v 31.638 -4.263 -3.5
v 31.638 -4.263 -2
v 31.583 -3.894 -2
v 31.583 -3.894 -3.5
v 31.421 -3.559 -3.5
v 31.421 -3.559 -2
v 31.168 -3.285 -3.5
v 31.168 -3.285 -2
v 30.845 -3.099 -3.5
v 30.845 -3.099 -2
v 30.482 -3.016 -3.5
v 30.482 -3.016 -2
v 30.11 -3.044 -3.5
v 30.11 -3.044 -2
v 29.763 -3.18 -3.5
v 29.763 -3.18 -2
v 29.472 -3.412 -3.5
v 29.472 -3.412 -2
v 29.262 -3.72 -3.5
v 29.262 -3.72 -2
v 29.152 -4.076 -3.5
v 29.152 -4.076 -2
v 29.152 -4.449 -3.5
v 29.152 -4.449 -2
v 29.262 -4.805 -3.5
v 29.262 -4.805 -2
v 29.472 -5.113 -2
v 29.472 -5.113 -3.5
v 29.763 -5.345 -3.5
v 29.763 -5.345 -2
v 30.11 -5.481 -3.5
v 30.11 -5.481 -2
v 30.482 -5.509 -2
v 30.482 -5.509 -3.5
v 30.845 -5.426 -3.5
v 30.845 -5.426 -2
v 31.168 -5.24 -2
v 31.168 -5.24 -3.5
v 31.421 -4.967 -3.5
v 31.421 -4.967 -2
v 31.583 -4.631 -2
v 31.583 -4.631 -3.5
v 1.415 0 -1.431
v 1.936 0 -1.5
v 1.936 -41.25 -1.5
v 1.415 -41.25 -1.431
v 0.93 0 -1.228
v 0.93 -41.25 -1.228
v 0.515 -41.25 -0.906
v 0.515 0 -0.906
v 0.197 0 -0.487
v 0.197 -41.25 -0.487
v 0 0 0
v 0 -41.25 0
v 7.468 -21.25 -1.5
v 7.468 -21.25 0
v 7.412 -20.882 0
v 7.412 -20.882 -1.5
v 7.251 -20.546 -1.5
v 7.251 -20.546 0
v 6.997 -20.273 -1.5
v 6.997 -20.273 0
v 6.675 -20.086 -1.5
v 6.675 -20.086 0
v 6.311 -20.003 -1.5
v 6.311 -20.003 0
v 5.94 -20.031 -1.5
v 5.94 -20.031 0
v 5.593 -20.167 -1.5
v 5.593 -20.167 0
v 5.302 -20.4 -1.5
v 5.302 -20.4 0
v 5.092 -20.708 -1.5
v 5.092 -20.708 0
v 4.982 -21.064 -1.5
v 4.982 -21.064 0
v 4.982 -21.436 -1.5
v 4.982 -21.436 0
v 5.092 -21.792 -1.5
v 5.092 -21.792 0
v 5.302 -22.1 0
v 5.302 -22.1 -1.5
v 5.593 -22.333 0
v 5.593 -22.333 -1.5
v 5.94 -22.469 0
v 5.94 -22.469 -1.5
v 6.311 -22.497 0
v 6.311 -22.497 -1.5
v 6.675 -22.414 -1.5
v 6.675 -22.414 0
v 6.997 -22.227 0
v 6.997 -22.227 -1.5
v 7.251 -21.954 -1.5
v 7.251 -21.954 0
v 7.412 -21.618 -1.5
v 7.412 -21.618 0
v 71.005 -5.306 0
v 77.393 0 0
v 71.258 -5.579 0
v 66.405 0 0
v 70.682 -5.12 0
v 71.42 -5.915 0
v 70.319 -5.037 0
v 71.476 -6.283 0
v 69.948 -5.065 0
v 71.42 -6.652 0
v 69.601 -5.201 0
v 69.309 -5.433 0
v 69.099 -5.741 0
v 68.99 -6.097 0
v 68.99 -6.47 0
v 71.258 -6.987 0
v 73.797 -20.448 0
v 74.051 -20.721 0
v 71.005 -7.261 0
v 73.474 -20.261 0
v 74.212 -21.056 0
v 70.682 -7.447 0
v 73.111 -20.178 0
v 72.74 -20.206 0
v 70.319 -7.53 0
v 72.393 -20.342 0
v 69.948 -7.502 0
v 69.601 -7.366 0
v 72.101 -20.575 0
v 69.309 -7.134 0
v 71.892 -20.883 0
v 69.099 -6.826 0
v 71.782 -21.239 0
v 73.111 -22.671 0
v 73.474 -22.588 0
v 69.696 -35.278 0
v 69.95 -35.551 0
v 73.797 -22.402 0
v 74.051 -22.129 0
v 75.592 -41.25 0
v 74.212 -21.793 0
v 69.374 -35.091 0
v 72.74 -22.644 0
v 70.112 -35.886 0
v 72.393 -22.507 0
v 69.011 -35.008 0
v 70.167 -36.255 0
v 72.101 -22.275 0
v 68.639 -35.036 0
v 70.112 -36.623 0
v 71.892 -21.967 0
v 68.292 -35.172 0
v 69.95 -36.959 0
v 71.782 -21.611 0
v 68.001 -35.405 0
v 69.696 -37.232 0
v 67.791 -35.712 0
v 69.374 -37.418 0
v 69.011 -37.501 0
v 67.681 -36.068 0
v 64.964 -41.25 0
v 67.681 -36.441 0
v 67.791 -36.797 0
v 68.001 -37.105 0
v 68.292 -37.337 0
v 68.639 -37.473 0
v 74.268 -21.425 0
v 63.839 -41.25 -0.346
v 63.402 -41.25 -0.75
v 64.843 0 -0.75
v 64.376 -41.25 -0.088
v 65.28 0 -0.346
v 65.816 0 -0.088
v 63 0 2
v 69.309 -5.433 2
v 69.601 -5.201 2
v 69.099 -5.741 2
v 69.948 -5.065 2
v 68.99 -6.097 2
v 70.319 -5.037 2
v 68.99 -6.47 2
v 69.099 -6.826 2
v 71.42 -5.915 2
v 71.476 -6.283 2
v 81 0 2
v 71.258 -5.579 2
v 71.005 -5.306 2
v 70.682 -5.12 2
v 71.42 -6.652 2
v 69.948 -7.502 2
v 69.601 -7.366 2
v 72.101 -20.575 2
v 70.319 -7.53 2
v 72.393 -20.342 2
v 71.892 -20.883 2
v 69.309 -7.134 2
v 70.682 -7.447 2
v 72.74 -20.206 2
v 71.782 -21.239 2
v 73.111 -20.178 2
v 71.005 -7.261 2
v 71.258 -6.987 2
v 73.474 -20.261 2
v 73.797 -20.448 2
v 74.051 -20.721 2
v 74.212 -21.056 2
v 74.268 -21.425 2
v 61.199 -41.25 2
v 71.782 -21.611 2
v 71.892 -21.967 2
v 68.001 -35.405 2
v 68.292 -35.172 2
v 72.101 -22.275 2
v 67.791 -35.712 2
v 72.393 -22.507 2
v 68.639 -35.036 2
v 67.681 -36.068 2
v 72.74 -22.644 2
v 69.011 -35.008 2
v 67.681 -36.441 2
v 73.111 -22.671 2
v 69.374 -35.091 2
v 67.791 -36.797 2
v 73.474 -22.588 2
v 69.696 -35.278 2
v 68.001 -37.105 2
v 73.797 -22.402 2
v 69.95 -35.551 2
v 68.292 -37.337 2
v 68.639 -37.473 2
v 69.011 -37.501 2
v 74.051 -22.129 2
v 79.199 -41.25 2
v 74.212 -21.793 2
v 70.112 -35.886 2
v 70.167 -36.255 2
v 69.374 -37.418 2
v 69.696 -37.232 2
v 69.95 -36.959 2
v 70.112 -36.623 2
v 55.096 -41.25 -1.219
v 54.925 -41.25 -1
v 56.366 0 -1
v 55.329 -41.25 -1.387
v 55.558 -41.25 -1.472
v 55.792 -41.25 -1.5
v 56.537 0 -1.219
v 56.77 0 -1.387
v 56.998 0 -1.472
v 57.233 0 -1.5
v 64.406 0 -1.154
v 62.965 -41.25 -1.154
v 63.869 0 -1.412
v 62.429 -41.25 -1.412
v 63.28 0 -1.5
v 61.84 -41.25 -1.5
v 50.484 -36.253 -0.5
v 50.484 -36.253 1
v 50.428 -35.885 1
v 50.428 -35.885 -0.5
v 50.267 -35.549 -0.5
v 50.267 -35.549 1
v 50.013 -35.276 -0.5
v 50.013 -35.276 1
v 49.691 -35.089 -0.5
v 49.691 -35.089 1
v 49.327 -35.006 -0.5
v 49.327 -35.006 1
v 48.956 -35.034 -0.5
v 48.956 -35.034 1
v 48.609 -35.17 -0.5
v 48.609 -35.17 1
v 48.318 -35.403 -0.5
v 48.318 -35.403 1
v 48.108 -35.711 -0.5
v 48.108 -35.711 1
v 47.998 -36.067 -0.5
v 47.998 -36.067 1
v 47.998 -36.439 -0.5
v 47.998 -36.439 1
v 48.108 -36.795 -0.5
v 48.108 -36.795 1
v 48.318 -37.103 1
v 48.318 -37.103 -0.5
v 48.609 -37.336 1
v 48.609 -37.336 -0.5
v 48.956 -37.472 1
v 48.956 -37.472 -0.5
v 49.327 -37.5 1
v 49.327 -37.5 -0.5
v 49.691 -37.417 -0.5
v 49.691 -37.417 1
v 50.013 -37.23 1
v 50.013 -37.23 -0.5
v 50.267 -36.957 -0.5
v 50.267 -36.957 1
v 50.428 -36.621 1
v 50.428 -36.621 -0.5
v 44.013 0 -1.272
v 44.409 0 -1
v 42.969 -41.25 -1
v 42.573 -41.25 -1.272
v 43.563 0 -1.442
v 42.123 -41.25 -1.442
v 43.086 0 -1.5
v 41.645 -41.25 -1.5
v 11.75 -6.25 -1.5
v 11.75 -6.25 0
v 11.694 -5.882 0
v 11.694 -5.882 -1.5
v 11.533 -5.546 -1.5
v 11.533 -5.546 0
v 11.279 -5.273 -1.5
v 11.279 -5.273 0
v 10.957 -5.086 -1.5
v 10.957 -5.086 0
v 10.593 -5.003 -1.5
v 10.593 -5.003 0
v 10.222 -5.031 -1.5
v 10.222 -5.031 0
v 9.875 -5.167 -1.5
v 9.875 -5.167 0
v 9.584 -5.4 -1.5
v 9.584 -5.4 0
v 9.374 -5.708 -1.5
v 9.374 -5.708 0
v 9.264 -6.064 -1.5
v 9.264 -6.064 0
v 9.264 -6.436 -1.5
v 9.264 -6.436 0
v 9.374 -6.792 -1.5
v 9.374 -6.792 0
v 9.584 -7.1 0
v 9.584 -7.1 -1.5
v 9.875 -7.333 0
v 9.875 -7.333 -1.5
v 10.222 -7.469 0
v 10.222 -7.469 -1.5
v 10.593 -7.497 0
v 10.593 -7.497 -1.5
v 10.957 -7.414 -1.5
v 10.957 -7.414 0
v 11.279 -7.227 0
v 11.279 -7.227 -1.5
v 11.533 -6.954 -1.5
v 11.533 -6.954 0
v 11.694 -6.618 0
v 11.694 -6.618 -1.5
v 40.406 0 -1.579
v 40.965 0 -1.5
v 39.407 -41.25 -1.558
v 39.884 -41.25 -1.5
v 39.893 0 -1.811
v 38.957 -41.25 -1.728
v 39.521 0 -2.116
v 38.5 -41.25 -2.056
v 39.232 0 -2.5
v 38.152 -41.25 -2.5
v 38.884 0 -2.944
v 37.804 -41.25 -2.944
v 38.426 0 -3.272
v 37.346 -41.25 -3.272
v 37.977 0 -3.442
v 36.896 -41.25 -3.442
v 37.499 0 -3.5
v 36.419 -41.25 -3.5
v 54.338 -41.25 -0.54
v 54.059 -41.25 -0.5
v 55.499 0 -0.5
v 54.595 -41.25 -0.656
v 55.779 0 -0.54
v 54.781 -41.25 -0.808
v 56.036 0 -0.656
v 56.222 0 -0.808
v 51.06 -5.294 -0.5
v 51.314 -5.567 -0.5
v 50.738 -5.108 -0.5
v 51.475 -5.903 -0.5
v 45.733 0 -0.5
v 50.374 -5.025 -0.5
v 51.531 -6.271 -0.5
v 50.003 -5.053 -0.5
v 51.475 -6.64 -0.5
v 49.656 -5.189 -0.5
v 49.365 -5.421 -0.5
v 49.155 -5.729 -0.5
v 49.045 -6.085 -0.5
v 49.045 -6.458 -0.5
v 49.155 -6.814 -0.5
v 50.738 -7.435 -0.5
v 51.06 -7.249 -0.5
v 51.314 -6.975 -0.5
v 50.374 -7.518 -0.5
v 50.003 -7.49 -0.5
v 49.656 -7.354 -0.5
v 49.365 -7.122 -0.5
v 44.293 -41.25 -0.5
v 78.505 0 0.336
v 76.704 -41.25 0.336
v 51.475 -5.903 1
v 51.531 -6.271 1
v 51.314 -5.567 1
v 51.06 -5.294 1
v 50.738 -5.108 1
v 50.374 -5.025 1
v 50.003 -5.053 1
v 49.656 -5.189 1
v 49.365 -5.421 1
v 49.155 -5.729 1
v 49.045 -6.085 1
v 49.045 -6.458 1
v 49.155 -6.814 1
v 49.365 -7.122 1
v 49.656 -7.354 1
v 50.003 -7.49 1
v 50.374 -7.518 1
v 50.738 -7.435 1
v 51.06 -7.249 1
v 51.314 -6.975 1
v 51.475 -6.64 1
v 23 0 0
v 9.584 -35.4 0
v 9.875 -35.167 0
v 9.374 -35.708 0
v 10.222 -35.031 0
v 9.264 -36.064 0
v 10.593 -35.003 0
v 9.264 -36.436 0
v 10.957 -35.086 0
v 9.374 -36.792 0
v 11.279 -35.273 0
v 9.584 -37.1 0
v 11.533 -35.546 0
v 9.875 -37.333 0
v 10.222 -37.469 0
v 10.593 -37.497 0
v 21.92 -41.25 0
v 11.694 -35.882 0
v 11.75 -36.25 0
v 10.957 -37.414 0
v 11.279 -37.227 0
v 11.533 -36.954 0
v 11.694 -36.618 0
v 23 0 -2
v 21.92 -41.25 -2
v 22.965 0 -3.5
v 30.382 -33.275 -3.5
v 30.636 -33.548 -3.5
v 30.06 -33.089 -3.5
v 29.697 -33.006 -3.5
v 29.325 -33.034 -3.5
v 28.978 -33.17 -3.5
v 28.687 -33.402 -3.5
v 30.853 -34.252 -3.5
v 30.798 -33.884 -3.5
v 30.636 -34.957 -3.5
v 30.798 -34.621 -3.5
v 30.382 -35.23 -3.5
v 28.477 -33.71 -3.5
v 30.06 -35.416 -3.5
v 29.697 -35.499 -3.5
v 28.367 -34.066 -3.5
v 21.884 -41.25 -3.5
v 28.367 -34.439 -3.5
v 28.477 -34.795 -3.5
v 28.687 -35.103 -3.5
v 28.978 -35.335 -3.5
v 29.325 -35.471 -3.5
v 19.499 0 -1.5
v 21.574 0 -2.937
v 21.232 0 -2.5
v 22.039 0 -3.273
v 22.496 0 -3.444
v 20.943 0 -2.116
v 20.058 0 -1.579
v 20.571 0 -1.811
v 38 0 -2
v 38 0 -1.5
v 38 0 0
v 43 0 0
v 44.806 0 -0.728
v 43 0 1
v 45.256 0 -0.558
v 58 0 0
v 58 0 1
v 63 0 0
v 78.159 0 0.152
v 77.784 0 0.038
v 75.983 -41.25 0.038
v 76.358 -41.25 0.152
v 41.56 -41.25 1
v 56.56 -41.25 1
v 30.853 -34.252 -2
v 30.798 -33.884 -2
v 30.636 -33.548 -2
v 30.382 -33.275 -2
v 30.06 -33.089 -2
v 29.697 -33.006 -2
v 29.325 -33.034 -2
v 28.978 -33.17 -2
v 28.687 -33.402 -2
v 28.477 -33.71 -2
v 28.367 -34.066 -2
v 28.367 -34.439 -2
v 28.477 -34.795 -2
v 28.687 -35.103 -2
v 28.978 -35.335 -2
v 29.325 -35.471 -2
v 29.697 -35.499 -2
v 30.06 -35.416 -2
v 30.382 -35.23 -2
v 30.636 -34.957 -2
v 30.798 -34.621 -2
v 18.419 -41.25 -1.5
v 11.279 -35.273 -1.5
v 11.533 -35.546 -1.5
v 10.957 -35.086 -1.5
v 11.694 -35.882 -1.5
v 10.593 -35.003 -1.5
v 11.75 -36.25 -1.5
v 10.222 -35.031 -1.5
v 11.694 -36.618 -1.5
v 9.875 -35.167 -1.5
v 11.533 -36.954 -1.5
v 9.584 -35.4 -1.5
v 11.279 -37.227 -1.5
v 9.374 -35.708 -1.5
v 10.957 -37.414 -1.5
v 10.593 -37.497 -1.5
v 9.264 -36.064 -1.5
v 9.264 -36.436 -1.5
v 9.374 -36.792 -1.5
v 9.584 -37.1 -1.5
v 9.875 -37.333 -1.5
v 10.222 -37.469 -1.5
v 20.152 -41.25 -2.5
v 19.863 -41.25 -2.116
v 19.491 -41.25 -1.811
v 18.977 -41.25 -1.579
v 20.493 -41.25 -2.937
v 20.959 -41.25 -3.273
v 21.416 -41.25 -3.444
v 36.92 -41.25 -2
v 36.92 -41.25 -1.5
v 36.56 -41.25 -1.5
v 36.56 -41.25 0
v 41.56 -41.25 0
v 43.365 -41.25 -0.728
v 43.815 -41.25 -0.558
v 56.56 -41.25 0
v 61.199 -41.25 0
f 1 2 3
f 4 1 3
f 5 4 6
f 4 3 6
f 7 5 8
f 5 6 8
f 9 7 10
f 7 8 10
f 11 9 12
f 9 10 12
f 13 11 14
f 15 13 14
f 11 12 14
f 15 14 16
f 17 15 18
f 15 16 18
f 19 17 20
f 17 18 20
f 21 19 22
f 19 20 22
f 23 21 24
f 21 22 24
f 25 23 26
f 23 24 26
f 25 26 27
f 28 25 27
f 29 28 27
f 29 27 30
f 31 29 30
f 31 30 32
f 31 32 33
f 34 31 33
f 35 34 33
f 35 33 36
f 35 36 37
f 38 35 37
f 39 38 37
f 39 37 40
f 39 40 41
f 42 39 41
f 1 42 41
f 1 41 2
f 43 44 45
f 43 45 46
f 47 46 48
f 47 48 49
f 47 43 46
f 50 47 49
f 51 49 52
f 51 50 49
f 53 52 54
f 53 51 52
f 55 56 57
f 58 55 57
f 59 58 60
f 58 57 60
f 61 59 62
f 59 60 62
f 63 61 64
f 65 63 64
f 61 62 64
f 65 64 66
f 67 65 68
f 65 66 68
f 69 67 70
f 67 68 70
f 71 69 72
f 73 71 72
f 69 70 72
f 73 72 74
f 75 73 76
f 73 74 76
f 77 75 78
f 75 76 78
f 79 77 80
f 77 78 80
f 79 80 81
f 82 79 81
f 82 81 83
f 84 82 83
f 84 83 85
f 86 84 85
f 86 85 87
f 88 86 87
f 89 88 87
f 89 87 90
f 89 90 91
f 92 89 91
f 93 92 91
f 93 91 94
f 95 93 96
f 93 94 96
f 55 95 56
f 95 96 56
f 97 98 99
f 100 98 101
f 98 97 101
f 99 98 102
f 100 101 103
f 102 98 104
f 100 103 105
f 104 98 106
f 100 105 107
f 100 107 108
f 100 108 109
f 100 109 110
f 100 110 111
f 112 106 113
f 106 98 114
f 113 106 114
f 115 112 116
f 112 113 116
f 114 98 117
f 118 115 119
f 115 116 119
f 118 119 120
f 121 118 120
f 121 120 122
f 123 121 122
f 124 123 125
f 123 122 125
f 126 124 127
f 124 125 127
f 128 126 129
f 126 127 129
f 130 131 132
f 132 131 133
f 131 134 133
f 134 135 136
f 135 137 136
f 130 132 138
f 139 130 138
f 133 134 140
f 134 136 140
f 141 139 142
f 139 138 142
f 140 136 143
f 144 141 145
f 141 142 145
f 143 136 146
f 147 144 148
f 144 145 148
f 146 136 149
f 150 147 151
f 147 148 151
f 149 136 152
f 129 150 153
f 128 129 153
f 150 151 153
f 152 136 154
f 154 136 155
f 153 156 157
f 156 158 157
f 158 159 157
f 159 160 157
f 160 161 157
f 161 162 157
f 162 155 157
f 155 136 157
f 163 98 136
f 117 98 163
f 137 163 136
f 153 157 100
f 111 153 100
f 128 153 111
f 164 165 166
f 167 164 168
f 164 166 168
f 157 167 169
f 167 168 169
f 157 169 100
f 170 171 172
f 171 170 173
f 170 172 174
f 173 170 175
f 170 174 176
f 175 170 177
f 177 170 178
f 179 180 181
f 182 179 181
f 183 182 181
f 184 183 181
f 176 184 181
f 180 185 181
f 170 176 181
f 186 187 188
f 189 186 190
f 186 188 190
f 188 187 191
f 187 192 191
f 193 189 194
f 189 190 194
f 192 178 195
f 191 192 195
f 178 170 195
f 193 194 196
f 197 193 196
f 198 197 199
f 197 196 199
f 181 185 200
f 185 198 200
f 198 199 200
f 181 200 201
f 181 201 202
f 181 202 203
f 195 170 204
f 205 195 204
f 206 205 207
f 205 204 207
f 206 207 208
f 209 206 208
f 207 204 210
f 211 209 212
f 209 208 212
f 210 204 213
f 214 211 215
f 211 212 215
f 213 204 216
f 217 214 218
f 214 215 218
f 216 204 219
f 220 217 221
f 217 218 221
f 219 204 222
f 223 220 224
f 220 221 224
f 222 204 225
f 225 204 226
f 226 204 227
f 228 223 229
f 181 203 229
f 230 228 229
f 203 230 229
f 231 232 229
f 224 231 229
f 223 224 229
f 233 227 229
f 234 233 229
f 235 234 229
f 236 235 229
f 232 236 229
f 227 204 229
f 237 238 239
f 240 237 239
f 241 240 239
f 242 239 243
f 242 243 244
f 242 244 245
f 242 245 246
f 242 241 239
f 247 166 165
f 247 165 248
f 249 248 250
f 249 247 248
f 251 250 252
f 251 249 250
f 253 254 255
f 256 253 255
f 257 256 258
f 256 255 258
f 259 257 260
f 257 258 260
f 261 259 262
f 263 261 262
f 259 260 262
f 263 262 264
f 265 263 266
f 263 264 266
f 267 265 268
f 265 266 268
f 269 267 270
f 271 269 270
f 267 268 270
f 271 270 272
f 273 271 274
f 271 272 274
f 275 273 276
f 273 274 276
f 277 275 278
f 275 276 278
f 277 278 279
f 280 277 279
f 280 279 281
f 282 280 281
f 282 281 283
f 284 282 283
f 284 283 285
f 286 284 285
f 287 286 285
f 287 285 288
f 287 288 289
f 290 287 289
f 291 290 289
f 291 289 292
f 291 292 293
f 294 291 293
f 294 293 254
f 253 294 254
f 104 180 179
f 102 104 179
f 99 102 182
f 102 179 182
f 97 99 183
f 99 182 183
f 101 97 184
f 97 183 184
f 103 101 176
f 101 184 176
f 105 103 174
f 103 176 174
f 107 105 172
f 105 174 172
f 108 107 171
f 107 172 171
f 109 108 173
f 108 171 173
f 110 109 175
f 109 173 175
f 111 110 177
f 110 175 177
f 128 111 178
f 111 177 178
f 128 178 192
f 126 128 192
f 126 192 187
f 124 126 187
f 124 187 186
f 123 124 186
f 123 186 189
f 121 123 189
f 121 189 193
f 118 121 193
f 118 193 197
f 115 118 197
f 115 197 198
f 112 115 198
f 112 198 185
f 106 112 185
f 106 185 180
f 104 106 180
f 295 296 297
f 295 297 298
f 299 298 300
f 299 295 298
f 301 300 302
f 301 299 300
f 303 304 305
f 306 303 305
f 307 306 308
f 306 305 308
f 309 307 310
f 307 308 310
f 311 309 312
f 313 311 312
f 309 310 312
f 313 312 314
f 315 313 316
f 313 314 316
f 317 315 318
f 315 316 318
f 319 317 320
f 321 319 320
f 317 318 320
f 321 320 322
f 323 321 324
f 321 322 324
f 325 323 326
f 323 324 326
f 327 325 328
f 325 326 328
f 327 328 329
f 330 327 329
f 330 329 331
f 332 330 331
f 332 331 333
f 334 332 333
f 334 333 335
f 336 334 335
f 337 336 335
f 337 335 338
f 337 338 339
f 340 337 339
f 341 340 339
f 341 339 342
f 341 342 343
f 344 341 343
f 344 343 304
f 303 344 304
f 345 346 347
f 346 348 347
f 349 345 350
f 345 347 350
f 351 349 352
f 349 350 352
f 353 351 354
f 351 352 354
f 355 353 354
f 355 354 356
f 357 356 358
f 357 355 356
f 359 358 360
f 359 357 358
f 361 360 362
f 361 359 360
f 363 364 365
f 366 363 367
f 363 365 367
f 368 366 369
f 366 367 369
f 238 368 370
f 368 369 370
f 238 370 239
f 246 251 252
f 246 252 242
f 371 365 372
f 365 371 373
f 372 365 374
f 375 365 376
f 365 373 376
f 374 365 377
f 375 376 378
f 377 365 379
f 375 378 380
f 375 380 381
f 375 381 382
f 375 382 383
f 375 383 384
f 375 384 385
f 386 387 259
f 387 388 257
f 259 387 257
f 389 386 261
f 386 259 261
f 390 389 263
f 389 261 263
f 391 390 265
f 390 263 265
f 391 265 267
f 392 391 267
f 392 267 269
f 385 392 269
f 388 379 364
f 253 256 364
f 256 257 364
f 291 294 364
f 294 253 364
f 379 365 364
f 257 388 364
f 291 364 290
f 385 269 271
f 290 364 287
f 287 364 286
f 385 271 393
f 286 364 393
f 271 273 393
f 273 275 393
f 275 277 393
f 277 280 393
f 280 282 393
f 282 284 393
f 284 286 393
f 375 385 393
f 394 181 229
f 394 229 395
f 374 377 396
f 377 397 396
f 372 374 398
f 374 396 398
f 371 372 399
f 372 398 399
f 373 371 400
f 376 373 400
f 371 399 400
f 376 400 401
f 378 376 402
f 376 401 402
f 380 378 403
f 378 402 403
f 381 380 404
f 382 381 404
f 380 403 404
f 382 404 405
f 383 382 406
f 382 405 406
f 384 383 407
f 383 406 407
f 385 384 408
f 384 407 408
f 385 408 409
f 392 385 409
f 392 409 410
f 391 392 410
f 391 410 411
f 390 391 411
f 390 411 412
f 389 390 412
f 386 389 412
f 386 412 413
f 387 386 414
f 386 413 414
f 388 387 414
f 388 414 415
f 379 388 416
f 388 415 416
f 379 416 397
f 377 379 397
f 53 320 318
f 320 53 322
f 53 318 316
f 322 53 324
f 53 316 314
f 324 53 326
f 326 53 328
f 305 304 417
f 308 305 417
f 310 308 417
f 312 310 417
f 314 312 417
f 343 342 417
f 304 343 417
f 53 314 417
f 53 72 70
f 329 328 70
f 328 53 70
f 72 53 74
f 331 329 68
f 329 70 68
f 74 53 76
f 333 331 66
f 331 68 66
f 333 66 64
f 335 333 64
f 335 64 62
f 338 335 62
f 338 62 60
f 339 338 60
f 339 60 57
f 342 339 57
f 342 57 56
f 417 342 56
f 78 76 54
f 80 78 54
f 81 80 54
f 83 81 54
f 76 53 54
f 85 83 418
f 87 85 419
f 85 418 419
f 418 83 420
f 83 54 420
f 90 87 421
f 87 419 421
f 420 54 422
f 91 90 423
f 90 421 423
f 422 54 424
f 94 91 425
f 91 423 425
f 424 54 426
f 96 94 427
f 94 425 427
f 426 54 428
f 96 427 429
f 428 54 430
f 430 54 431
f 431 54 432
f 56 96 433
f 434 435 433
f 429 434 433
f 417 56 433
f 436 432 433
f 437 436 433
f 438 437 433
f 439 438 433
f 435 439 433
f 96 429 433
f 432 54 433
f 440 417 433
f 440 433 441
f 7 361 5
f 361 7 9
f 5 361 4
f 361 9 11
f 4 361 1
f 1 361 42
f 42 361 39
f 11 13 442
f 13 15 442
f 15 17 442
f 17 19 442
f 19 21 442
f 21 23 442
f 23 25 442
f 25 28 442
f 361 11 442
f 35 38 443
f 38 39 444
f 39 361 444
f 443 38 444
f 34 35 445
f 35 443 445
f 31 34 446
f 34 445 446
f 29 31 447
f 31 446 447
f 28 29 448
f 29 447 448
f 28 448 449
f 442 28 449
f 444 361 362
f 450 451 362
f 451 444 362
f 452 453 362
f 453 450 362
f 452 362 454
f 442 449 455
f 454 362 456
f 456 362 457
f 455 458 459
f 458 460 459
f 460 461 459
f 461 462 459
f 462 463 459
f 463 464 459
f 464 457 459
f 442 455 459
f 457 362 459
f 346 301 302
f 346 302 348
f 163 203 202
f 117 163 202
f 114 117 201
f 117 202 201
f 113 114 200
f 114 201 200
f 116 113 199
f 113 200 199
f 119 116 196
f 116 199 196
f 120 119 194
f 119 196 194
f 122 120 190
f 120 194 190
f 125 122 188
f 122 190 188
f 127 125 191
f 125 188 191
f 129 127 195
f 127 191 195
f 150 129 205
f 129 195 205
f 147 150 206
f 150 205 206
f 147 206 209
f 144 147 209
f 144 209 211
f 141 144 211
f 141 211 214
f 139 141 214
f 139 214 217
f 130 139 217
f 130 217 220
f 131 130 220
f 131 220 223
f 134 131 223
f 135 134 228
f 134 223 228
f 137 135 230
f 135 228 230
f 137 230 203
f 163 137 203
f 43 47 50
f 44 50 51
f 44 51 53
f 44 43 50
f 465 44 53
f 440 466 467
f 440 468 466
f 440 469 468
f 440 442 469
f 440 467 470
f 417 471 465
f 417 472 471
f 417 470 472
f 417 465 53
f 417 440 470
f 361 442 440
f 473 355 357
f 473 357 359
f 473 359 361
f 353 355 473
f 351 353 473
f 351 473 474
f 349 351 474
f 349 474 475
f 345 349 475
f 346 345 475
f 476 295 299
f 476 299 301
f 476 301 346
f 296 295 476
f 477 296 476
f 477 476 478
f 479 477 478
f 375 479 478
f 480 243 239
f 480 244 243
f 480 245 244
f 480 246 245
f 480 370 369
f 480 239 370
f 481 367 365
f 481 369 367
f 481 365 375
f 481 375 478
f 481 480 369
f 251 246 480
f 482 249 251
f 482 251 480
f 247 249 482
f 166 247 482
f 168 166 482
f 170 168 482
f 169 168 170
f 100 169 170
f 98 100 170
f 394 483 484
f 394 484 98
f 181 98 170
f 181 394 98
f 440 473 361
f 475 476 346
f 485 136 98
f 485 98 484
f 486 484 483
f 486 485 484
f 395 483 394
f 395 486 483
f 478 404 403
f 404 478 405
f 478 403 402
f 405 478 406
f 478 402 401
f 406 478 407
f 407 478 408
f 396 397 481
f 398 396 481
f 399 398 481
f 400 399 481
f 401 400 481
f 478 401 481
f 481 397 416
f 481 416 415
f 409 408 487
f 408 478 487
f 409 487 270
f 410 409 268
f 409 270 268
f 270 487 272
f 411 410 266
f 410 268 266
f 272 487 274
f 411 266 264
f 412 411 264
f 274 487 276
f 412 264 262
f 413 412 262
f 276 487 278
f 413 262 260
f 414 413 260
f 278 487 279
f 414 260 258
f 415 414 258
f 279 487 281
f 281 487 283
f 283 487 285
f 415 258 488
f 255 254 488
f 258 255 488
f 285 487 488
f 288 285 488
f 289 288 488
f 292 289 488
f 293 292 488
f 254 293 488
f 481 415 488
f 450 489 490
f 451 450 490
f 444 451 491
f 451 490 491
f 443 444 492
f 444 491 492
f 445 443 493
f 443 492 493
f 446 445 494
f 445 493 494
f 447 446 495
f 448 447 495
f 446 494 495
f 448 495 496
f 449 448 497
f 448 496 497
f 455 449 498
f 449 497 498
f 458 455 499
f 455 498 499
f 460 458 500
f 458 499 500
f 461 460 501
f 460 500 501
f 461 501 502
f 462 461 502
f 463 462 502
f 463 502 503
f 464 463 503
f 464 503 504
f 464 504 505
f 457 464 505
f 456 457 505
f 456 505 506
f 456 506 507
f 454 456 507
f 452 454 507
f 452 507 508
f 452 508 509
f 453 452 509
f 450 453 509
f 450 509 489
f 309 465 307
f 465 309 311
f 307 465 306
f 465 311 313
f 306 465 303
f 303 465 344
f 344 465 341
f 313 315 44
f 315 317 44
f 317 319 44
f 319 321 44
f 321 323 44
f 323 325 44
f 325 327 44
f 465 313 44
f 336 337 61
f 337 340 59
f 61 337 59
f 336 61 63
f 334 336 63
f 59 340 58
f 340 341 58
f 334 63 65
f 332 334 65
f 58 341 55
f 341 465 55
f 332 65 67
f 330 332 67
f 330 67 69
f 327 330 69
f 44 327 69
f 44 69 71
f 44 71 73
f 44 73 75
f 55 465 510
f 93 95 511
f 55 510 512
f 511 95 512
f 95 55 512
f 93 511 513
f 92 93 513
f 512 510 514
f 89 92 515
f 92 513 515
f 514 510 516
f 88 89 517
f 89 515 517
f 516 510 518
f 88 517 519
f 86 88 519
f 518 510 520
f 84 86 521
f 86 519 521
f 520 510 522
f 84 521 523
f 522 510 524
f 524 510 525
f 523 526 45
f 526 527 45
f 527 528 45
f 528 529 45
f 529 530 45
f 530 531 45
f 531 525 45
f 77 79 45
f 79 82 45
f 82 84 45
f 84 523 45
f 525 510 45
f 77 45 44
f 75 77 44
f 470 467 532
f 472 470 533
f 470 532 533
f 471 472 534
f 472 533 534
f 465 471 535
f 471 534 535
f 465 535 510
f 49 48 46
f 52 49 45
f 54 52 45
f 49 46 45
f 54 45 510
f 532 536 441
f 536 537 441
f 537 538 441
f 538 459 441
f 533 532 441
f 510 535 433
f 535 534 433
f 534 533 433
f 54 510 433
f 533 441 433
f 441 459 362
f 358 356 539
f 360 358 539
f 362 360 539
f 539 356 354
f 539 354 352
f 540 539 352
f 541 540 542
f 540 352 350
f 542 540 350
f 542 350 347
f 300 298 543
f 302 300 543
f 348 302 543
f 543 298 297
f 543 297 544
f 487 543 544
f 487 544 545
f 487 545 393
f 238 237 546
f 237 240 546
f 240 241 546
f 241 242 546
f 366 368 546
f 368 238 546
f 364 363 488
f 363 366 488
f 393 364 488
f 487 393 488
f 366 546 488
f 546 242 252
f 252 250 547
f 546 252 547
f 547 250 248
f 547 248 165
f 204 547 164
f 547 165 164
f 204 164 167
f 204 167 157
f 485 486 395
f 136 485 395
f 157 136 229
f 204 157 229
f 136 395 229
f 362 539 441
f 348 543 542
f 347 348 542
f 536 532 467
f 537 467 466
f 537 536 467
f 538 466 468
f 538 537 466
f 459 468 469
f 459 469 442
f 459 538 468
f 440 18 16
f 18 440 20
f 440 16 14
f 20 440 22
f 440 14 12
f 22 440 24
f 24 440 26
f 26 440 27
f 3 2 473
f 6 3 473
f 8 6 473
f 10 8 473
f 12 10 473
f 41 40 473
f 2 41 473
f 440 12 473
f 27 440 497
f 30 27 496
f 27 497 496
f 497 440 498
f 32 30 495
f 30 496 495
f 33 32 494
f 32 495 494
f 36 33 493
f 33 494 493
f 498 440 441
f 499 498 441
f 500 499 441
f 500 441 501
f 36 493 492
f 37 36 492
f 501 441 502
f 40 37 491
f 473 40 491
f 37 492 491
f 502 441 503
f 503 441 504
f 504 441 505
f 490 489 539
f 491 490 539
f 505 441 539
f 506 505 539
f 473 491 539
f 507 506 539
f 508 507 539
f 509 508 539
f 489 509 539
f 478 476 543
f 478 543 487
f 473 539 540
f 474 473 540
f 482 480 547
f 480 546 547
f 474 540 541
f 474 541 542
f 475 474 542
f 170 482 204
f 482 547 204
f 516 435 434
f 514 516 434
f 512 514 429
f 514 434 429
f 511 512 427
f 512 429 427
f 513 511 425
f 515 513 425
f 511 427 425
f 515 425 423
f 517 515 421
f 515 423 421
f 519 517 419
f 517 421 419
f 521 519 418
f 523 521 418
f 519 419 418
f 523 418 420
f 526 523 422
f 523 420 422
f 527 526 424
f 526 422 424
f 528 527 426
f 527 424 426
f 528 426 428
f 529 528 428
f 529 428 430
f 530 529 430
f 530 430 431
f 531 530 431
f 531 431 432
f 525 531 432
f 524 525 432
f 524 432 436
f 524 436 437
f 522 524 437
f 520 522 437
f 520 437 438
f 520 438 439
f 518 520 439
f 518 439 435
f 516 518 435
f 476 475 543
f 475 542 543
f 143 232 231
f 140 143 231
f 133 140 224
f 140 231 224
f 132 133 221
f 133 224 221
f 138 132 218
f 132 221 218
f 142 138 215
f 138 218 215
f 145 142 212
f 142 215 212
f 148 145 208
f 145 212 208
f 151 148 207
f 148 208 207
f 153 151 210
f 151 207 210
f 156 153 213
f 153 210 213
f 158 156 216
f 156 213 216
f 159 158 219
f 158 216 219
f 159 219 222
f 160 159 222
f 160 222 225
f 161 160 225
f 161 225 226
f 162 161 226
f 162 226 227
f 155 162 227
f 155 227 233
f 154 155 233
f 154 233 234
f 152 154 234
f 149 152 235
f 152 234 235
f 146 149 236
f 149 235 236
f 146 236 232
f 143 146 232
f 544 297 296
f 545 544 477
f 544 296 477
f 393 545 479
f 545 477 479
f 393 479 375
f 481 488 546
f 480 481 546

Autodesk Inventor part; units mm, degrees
ref_plane "YZ Plane" through (0, 0, 0) normal (1, 0, 0) x (0, 1, 0)
ref_plane "XY Plane" through (0, 0, 0) normal (0, 0, 1) x (1, 0, 0)
sketch "Sketch1" plane through (0, 0, 0) normal (0, 0, 1) x (1, 0, 0)
  line L0 (0, 0) -> (81, 0)
  line L1 (0, 0) -> (0, -41.25)
  line L2 (0, -41.25) -> (76.5595, -41.25)
  line L3 (10.5, 0) -> (10.5, -41.25)
  line L4 (30.5, 0) -> (29.4198, -41.25)
  line L5 (30.5, 0) -> (71.7641, 0) construction
  line L6 (50.5, 0) -> (49.0595, -41.25)
  line L7 (70.5, 0) -> (68.699, -41.25)
  line L8 (78, 0) -> (76.5595, -41.25)
  line L9 (78, 0) -> (119.2751, 0) construction
  line L10 (76.5595, -41.25) -> (81, 0)
  line L11 (3, 0) -> (3, -41.25)
  line L12 (18, 0) -> (18, -41.25)
  line L13 (23, 0) -> (21.9198, -41.25)
  line L14 (23, 0) -> (64.2641, 0) construction
  line L15 (38, 0) -> (36.9198, -41.25)
  line L16 (38, 0) -> (79.2641, 0) construction
  line L17 (43, 0) -> (41.5595, -41.25)
  line L18 (43, 0) -> (84.2751, 0) construction
  line L19 (58, 0) -> (56.5595, -41.25)
  line L20 (58, 0) -> (99.2751, 0) construction
  line L21 (63, 0) -> (61.199, -41.25)
  line L22 (63, 0) -> (104.2893, 0) construction
  line L23 (29.4198, -41.25) -> (29.6031, -34.2524)
  line L24 (29.6031, -34.2524) -> (30.3884, -4.2627)
  line L25 (49.0595, -41.25) -> (49.234, -36.253)
  line L26 (49.234, -36.253) -> (50.281, -6.2713)
  line L27 (68.699, -41.25) -> (68.9171, -36.2548)
  line L28 (68.9171, -36.2548) -> (70.2257, -6.2833)
  circle A0 centre (10.5, -6.25) radius 1.25
  circle A1 centre (10.5, -36.25) radius 1.25
  circle A2 centre (30.3884, -4.2627) radius 1.25
  circle A3 centre (29.6031, -34.2524) radius 1.25
  circle A4 centre (50.281, -6.2713) radius 1.25
  circle A5 centre (49.234, -36.253) radius 1.25
  circle A6 centre (70.2257, -6.2833) radius 1.25
  circle A7 centre (68.9171, -36.2548) radius 1.25
  line L29 (10.5, -6.25) -> (10.5, -21.25)
  line L30 (10.5, -21.25) -> (6.218, -21.25)
  circle A8 centre (6.218, -21.25) radius 1.25
  line L31 (6.218, -21.25) -> (73.0178, -21.4249)
  line L32 (6.218, -21.25) -> (73.018, -21.25) construction
  circle A9 centre (73.0178, -21.4249) radius 1.25
  dimension "d10" = 92
  dimension "d11" = 91.5
  dimension "d12" = 91.5
  dimension "d13" = 92
  dimension "d14" = 92
  dimension "d15" = 92.5
  dimension "d67" = 2.5
  dimension "d68" = 2.5
  dimension "d69" = 2.5
  dimension "d70" = 2.5
  dimension "d71" = 2.5
  dimension "d72" = 2.5
  dimension "d73" = 2.5
  dimension "d74" = 2.5
  dimension "d77" = 15
  dimension "d78" = 4.282
  dimension "d79" = 2.5
  dimension "d80" = 66.8
  dimension "d81" = 0.15
  dimension "d82" = 2.5
sketch "Sketch2" plane through (0, 0, 0) normal (0, 1, 0) x (-1, 0, 0)
  line L0 (-43, 0) -> (-58, 0)
  line L1 (-58, 0) -> (-58, 1)
  line L2 (-58, 1) -> (-43, 1)
  line L3 (-43, 1) -> (-43, 0)
  line L4 (-64.4672, 0) -> (-78, 0)
  line L5 (-78, 0) -> (-78, 2)
  line L6 (-78, 2) -> (-63, 2)
  line L7 (-63, 2) -> (-63, 0)
  line L8 (-23, 0) -> (-21.9198, 0) projected
  line L9 (-30.5, 0) -> (-29.4198, 0) projected
  line L10 (-23, 0) -> (-38, 0)
  line L11 (-38, 0) -> (-38, -2)
  line L12 (-38, -2) -> (-23, -2)
  line L13 (-23, -2) -> (-23, 0)
  line L14 (0, 0) -> (-23, 0)
  line L15 (-23, 0) -> (-23, -1.5)
  line L16 (-21.5, -1.5) -> (0, -1.5)
  line L17 (0, -1.5) -> (0, 0)
  line L18 (-23, 0) -> (-21.5, 0)
  line L19 (-21.5, -1.5) -> (-21.5, -3.5)
  line L20 (-21.5, -3.5) -> (-23, -3.5)
  line L21 (-23, -2) -> (-23, 0)
  line L22 (-23, -2) -> (-38, -2)
  line L23 (-39.5, -2) -> (-39.5, -3.5)
  line L24 (-39.5, -3.5) -> (-23, -3.5)
  line L25 (-39.5, -2) -> (-39.5, -1.5)
  line L26 (-39.5, 0) -> (-38, 0)
  line L27 (-38, 0) -> (-38, -2)
  line L28 (-38, 0) -> (-43, 0)
  line L29 (-43, -0.5) -> (-43, -1.5)
  line L30 (-43, -1.5) -> (-39.5, -1.5)
  line L31 (-38, -1.5) -> (-38, 0)
  line L32 (-43, 1) -> (-58, 1)
  line L33 (-58, 1) -> (-58, 0)
  line L34 (-56.5, -0.5) -> (-44, -0.5)
  line L35 (-43, -0.5) -> (-43, 1)
  line L36 (-38, 0) -> (-44, 0)
  line L37 (-44, -0.5) -> (-44, -1.5)
  line L38 (-44, -1.5) -> (-38, -1.5)
  line L39 (-38, -1.5) -> (-38, 0)
  line L40 (-56.5, 0) -> (-63, 0)
  line L41 (-64.4672, 0) -> (-64.4672, -1.5)
  line L42 (-64.4672, -1.5) -> (-56.5, -1.5)
  line L43 (-56.5, -1.5) -> (-56.5, -0.5)
  line L44 (-81, 2) -> (-78, 2)
  line L45 (-81, 2) -> (-78, 0)
  line L46 (-18, 0) -> (-18, -1.5)
  line L47 (0, 0) -> (-18, 0)
  line L48 (-18, 0) -> (-18, -1.5)
  line L49 (-18, -1.5) -> (0, -1.5)
  line L50 (0, -1.5) -> (0, 0)
  line L51 (-18, -1.5) -> (-18, 0)
  line L52 (-23, 0) -> (-23, -2)
  line L53 (-38, -2) -> (-38, 0)
  line L54 (-43, 0) -> (-43, -1.5)
  line L55 (-18, -1.5) -> (-21.5, -1.5)
  line L56 (-38, -2) -> (-23, -2)
  line L57 (-23, -2) -> (-23, 0)
  line L58 (-23, 0) -> (-18, 0)
  line L59 (-18, 0) -> (-18, -1.5)
  line L60 (-18, 0) -> (-23, 0)
  line L61 (-23, 0) -> (-23, -1.5)
  line L62 (-23, -1.5) -> (-18, -1.5)
  line L63 (-18, -1.5) -> (-18, 0)
  line L64 (-23, 0) -> (-21.5, 0)
  line L65 (-21.5, 0) -> (-21.5, -3.5)
  line L66 (-21.5, -3.5) -> (-23, -3.5)
  line L67 (-23, -3.5) -> (-23, 0)
  line L68 (-21.5, -3.5) -> (-39.5, -3.5)
  line L69 (-39.5, -3.5) -> (-39.5, -2)
  line L70 (-39.5, -2) -> (-21.5, -2)
  line L71 (-21.5, -2) -> (-21.5, -3.5)
  line L72 (-39.5, -2) -> (-38, -2)
  line L73 (-38, -2) -> (-38, 0)
  line L74 (-38, 0) -> (-39.5, 0)
  line L75 (-39.5, 0) -> (-39.5, -2)
  line L76 (-38, 0) -> (-44, 0)
  line L77 (-44, 0) -> (-44, -1.5)
  line L78 (-44, -1.5) -> (-38, -1.5)
  line L79 (-38, -1.5) -> (-38, 0)
  line L80 (-44, -0.5) -> (-58, -0.5)
  line L81 (-58, -0.5) -> (-58, 1)
  line L82 (-58, 1) -> (-44, 1)
  line L83 (-44, 1) -> (-44, -0.5)
  line L84 (-58, 1) -> (-56.5, 1)
  line L85 (-56.5, 1) -> (-56.5, -1.5)
  line L86 (-56.5, -1.5) -> (-58, -1.5)
  line L87 (-58, -1.5) -> (-58, 1)
  line L88 (-56.5, -1.5) -> (-64.4672, -1.5)
  line L89 (-64.4672, -1.5) -> (-64.4672, 0)
  line L90 (-64.4672, 0) -> (-56.5, 0)
  line L91 (-56.5, 0) -> (-56.5, -1.5)
  line L92 (-63, 0) -> (-78, 0)
  line L93 (-78, 0) -> (-78, 2)
  line L94 (-78, 2) -> (-63, 2)
  line L95 (-63, 2) -> (-63, 0)
  point P0 (-50.5, 0)
  point P1 (-58, 0)
  point P2 (-70.5, 0)
  point P3 (-81, 0)
  dimension "d24" = 1.5
  dimension "d29" = 6
ref_plane "Work Plane1" through (0, -41.25, 0) normal (0, 1, 0) x (-1, 0, 0)
sketch "Sketch3" plane through (0, -41.25, 0) normal (0, 1, 0) x (-1, 0, 0)
  line L0 (-23, 0) -> (-21.9198, 0) projected
  line L1 (-30.5, 0) -> (-29.4198, 0) projected
  line L2 (-38, 0) -> (-36.9198, 0) projected
  line L3 (-43, 0) -> (-41.5595, 0) projected
  line L4 (-50.5, 0) -> (-49.0595, 0) projected
  line L5 (-58, 0) -> (-56.5595, 0) projected
  line L6 (-63, 0) -> (-61.199, 0) projected
  line L7 (-70.5, 0) -> (-68.699, 0) projected
  line L8 (-78, 0) -> (-76.5595, 0) projected
  point P0 (0, 0)
  point P1 (-3, 0)
  point P2 (-3, 0)
  point P3 (-3, 0)
  point P4 (-10.5, 0)
  point P5 (-10.5, 0)
  point P6 (-10.5, 0)
  point P7 (-18, 0)
  point P8 (-18, 0)
  point P9 (-18, 0)
sketch "Sketch4" plane through (0, -41.25, 0) normal (0, 1, 0) x (-1, 0, 0)
  line L0 (0, 0) -> (-76.5595, 0) projected
  line L1 (-23, 0) -> (-21.9198, 0) projected
  line L2 (-30.5, 0) -> (-29.4198, 0) projected
  line L3 (-38, 0) -> (-36.9198, 0) projected
  line L4 (-43, 0) -> (-41.5595, 0) projected
  line L5 (-50.5, 0) -> (-49.0595, 0) projected
  line L6 (-58, 0) -> (-56.5595, 0) projected
  line L7 (-63, 0) -> (-61.199, 0) projected
  line L8 (-70.5, 0) -> (-68.699, 0) projected
  line L9 (-78, 0) -> (-76.5595, 0) projected
  line L10 (-21.9198, 0) -> (-36.9198, 0)
  line L11 (-36.9198, 0) -> (-36.9198, -2)
  line L12 (-36.9198, -2) -> (-21.9198, -2)
  line L13 (-21.9198, -2) -> (-21.9198, 0)
  line L14 (-41.5595, 0) -> (-56.5595, 0)
  line L15 (-56.5595, 0) -> (-56.5595, 1)
  line L16 (-56.5595, 1) -> (-41.5595, 1)
  line L17 (-41.5595, 1) -> (-41.5595, 0)
  line L18 (-61.199, 0) -> (-76.199, 0)
  line L19 (-76.199, 0) -> (-76.199, 2)
  line L20 (-76.199, 2) -> (-61.199, 2)
  line L21 (-61.199, 2) -> (-61.199, 0)
  point P0 (-3, 0)
  point P1 (-3, 0)
  point P2 (-3, 0)
  point P3 (-10.5, 0)
  point P4 (-10.5, 0)
  point P5 (-10.5, 0)
  point P6 (-18, 0)
  point P7 (-18, 0)
  point P8 (-18, 0)
  point P9 (-3, 0)
  point P10 (-10.5, 0)
  point P11 (-18, 0)
  dimension "d17" = 15
  dimension "d18" = 2
  dimension "d19" = 1
  dimension "d20" = 15
  dimension "d21" = 2
sketch "Sketch5" plane through (0, 0, 0) normal (0, 1, 0) x (-1, 0, 0)
  point P0 (0, 0)
sweep "Sweep1" add profiles "Sketch2" path "Sketch1" path curves L3 contours L14 L17 L16 L46
sweep "Sweep2" add profiles "Sketch2" path "Sketch1" path curves L13 contours L8 L14 L65 L62 L13 | L14 L46 L16 L65
sweep "Sweep3" add profiles "Sketch2" path "Sketch1" path curves L4 contours L70 L12 L67 L24 L23 | L70 L19 L20 L67
sweep "Sweep4" add profiles "Sketch2" path "Sketch1" path curves L4 contours L70 L19 L20 L67 | L13 L62 L19 L70
sketch3d "3D Sketch1"
  line L0 (39.5, 0, -2) -> (38.4198, -41.25, -2)
sweep "Sweep5" add profiles "Sketch2" path "3D Sketch1" contours L26 L11 L38 L75 | L38 L11 L70 L25
sweep "Sweep6" add profiles "Sketch2" path "Sketch1" path curves L17 contours L35 L29 L38 L37 L77 L0 | L28 L75 L30 L29 L35 | L26 L11 L38 L75
sweep "Sweep7" add profiles "Sketch2" path "Sketch1" path curves L6 contours L0 L83 L2 L3 | L0 L85 L2 L83 | L0 L1 L2 L85
sweep "Sweep8" add profiles "Sketch2" path "Sketch1" path curves L6 contours L77 L34 L85 L0 | L0 L85 L2 L83 | L85 L80 L81 L0 | L0 L1 L2 L85
sweep "Sweep9" add profiles "Sketch2" path "Sketch1" path curves L19 contours L85 L80 L81 L0 | L0 L1 L2 L85 | L43 L42 L87 L80
sketch3d "3D Sketch2"
  line L0 (58, 0, 1) -> (56.5595, -41.25, 1)
sweep "Sweep10" add profiles "Sketch2" path "3D Sketch2" contours L85 L80 L81 L0 | L81 L87 L42 L41 L90 L40 | L43 L42 L87 L80
sweep "Sweep11" add profiles "Sketch2" path "Sketch1" path curves L21 contours L90 L4 L5 L6 L7
sketch3d "3D Sketch3"
  line L0 (78, 0, 2) -> (76.199, -41.25, 2)
sweep "Sweep12" add profiles "Sketch2" path "3D Sketch3" contours L5 L45 L44
fillet "Fillet1" radius 2 1 edges at (77.0995, -20.625, 0)
fillet "Fillet2" radius 2 2 edges at (63.7469, -20.625, -1.5) (63.7469, -20.625, 0)
fillet "Fillet3" radius 1 2 edges at (55.7798, -20.625, -1.5) (55.7798, -20.625, -0.5)
fillet "Fillet4" radius 2 2 edges at (43.2798, -20.625, -0.5) (43.2798, -20.625, -1.5)
fillet "Fillet5" radius 2 2 edges at (38.9599, -20.625, -1.5) (38.9599, -20.625, -3.5)
fillet "Fillet6" radius 2 2 edges at (20.9599, -20.625, -3.5) (20.9599, -20.625, -1.5)
fillet "Fillet7" radius 2 1 edges at (0, -20.625, -1.5)
extrude "Extrusion1" cut sketch "Sketch1" along normal through all both and the other way through all contours A0 L3 | L3 A0 | A1 L3 | L3 A1 | A2 L4 | L4 A2 | A3 L4 | L4 A3 | A4 L6 | L6 A4 | A5 L6 | L6 A5 | A6 L7 | L7 A6 | A7 L7 | L7 A7
extrude "Extrusion2" cut sketch "Sketch1" along normal through all both and the other way through all contours L31 L30 A8 | A8 L30 L31 | A9
properties part number "Finger_Screwing_Cage_1"
